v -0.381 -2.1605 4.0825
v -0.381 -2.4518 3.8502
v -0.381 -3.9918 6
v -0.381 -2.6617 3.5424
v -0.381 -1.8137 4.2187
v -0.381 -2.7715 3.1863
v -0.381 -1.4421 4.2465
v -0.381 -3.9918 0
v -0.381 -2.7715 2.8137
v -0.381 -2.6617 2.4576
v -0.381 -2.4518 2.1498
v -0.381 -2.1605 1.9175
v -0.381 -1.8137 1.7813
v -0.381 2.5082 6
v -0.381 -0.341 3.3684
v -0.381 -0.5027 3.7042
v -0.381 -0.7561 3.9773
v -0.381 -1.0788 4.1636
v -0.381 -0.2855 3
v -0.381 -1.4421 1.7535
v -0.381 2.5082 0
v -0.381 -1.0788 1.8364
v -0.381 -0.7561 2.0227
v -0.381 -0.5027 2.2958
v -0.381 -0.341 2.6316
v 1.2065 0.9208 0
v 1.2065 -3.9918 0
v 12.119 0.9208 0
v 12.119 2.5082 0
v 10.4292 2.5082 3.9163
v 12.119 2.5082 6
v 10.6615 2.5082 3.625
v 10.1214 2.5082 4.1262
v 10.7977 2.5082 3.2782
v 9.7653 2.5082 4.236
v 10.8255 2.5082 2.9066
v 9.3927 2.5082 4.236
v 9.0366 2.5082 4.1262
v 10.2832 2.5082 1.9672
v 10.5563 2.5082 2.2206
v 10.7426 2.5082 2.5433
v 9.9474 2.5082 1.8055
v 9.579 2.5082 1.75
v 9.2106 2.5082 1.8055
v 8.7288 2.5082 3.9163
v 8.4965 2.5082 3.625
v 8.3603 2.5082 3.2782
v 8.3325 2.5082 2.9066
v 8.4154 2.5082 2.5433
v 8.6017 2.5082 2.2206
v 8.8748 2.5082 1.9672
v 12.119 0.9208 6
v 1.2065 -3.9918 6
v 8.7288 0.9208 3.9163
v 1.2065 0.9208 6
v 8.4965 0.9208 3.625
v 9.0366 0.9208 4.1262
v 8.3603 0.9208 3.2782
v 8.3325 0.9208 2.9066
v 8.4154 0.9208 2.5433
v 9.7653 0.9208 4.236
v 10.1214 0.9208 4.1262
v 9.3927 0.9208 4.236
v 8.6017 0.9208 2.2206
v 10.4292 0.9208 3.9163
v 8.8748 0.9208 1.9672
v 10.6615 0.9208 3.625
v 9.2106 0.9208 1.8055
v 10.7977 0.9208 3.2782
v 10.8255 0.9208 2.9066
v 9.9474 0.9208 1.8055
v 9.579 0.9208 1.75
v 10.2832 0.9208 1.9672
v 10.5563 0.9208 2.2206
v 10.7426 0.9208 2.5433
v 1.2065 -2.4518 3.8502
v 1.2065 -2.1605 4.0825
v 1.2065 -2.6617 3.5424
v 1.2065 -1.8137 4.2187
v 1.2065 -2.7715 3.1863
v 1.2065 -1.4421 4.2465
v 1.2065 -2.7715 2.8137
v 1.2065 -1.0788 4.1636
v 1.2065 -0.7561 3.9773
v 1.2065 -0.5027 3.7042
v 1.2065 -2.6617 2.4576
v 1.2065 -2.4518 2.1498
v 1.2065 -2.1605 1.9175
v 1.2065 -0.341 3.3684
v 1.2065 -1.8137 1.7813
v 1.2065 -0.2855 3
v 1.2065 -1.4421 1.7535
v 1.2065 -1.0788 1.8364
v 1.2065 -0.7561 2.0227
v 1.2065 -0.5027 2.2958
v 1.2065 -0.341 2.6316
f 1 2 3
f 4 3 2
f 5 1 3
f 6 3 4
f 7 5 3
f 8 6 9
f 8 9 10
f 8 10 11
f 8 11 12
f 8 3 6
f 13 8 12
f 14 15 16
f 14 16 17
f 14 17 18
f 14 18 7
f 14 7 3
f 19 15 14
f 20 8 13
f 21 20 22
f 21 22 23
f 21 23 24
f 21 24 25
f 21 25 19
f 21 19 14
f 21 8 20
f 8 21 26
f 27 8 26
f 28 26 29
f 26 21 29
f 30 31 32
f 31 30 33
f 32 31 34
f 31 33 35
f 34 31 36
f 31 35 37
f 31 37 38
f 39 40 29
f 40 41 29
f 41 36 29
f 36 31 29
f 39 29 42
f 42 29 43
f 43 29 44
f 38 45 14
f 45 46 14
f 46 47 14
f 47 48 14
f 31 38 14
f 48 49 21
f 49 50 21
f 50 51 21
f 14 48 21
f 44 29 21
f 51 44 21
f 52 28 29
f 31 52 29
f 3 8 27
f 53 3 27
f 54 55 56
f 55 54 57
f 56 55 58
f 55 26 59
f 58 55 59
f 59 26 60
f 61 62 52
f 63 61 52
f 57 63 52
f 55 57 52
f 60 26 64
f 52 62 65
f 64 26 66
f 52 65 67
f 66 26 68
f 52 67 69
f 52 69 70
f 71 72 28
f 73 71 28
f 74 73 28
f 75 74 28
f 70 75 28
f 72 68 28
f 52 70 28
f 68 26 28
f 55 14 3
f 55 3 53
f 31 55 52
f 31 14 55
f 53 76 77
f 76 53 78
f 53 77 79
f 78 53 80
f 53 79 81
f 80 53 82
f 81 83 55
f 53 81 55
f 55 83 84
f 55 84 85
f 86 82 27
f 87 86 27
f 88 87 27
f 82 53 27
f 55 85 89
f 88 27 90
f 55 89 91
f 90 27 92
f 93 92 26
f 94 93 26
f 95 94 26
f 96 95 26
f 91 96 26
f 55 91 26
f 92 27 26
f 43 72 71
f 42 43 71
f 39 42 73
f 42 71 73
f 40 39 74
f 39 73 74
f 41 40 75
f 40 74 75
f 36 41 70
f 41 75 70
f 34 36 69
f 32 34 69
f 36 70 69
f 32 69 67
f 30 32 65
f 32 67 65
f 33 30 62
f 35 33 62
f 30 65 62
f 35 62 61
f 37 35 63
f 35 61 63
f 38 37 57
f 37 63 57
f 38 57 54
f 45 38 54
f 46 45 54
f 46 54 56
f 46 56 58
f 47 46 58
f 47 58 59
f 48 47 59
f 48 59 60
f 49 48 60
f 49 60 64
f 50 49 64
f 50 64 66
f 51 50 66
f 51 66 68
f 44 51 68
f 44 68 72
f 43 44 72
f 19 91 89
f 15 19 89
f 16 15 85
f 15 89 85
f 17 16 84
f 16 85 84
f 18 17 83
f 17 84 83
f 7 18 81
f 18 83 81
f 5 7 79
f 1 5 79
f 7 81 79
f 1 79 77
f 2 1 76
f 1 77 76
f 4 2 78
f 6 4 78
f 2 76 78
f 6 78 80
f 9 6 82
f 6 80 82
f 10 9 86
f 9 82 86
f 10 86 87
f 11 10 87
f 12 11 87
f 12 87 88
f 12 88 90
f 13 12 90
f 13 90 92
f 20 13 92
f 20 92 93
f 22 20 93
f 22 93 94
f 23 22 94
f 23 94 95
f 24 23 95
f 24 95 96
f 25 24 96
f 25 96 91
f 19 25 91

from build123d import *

# Parameters (mm, degrees)
SKETCH1_W           = 1.5875
SKETCH1_H           = 6.5
SKETCH1_W_2         = 10.9125
SKETCH1_H_2         = 1.5875
BOSS_EXTRUDE1_DEPTH = 6
SKETCH2_R           = 1.25
CUT_EXTRUDE1_DEPTH  = 6
SKETCH3_R           = 1.25
CUT_EXTRUDE2_DEPTH  = 6


with BuildPart() as part:
    # Sketch1 → Boss-Extrude1 (new body)
    with BuildSketch(Plane.XY):
        with Locations((0.41275, -0.74175)):
            Rectangle(SKETCH1_W, SKETCH1_H)
        with Locations((6.66275, 1.7145)):
            Rectangle(SKETCH1_W_2, SKETCH1_H_2)
    extrude(amount=BOSS_EXTRUDE1_DEPTH)

    # Sketch2 → Cut-Extrude1 (cut)
    with BuildSketch(Plane(origin=(1.2065, 0, 0), x_dir=(0, 0, -1), z_dir=(1, 0, 0))):
        with Locations(Location((-3, -1.5355, 0), (0, 0, 90))):
            Circle(SKETCH2_R)
    extrude(amount=-CUT_EXTRUDE1_DEPTH, mode=Mode.SUBTRACT)

    # Sketch3 → Cut-Extrude2 (cut)
    with BuildSketch(Plane.XZ.offset(-0.92075)):
        with Locations(Location((9.579, 3, 0), (0, 0, 270))):
            Circle(SKETCH3_R)
    extrude(amount=-CUT_EXTRUDE2_DEPTH, mode=Mode.SUBTRACT)


solid = part.part
